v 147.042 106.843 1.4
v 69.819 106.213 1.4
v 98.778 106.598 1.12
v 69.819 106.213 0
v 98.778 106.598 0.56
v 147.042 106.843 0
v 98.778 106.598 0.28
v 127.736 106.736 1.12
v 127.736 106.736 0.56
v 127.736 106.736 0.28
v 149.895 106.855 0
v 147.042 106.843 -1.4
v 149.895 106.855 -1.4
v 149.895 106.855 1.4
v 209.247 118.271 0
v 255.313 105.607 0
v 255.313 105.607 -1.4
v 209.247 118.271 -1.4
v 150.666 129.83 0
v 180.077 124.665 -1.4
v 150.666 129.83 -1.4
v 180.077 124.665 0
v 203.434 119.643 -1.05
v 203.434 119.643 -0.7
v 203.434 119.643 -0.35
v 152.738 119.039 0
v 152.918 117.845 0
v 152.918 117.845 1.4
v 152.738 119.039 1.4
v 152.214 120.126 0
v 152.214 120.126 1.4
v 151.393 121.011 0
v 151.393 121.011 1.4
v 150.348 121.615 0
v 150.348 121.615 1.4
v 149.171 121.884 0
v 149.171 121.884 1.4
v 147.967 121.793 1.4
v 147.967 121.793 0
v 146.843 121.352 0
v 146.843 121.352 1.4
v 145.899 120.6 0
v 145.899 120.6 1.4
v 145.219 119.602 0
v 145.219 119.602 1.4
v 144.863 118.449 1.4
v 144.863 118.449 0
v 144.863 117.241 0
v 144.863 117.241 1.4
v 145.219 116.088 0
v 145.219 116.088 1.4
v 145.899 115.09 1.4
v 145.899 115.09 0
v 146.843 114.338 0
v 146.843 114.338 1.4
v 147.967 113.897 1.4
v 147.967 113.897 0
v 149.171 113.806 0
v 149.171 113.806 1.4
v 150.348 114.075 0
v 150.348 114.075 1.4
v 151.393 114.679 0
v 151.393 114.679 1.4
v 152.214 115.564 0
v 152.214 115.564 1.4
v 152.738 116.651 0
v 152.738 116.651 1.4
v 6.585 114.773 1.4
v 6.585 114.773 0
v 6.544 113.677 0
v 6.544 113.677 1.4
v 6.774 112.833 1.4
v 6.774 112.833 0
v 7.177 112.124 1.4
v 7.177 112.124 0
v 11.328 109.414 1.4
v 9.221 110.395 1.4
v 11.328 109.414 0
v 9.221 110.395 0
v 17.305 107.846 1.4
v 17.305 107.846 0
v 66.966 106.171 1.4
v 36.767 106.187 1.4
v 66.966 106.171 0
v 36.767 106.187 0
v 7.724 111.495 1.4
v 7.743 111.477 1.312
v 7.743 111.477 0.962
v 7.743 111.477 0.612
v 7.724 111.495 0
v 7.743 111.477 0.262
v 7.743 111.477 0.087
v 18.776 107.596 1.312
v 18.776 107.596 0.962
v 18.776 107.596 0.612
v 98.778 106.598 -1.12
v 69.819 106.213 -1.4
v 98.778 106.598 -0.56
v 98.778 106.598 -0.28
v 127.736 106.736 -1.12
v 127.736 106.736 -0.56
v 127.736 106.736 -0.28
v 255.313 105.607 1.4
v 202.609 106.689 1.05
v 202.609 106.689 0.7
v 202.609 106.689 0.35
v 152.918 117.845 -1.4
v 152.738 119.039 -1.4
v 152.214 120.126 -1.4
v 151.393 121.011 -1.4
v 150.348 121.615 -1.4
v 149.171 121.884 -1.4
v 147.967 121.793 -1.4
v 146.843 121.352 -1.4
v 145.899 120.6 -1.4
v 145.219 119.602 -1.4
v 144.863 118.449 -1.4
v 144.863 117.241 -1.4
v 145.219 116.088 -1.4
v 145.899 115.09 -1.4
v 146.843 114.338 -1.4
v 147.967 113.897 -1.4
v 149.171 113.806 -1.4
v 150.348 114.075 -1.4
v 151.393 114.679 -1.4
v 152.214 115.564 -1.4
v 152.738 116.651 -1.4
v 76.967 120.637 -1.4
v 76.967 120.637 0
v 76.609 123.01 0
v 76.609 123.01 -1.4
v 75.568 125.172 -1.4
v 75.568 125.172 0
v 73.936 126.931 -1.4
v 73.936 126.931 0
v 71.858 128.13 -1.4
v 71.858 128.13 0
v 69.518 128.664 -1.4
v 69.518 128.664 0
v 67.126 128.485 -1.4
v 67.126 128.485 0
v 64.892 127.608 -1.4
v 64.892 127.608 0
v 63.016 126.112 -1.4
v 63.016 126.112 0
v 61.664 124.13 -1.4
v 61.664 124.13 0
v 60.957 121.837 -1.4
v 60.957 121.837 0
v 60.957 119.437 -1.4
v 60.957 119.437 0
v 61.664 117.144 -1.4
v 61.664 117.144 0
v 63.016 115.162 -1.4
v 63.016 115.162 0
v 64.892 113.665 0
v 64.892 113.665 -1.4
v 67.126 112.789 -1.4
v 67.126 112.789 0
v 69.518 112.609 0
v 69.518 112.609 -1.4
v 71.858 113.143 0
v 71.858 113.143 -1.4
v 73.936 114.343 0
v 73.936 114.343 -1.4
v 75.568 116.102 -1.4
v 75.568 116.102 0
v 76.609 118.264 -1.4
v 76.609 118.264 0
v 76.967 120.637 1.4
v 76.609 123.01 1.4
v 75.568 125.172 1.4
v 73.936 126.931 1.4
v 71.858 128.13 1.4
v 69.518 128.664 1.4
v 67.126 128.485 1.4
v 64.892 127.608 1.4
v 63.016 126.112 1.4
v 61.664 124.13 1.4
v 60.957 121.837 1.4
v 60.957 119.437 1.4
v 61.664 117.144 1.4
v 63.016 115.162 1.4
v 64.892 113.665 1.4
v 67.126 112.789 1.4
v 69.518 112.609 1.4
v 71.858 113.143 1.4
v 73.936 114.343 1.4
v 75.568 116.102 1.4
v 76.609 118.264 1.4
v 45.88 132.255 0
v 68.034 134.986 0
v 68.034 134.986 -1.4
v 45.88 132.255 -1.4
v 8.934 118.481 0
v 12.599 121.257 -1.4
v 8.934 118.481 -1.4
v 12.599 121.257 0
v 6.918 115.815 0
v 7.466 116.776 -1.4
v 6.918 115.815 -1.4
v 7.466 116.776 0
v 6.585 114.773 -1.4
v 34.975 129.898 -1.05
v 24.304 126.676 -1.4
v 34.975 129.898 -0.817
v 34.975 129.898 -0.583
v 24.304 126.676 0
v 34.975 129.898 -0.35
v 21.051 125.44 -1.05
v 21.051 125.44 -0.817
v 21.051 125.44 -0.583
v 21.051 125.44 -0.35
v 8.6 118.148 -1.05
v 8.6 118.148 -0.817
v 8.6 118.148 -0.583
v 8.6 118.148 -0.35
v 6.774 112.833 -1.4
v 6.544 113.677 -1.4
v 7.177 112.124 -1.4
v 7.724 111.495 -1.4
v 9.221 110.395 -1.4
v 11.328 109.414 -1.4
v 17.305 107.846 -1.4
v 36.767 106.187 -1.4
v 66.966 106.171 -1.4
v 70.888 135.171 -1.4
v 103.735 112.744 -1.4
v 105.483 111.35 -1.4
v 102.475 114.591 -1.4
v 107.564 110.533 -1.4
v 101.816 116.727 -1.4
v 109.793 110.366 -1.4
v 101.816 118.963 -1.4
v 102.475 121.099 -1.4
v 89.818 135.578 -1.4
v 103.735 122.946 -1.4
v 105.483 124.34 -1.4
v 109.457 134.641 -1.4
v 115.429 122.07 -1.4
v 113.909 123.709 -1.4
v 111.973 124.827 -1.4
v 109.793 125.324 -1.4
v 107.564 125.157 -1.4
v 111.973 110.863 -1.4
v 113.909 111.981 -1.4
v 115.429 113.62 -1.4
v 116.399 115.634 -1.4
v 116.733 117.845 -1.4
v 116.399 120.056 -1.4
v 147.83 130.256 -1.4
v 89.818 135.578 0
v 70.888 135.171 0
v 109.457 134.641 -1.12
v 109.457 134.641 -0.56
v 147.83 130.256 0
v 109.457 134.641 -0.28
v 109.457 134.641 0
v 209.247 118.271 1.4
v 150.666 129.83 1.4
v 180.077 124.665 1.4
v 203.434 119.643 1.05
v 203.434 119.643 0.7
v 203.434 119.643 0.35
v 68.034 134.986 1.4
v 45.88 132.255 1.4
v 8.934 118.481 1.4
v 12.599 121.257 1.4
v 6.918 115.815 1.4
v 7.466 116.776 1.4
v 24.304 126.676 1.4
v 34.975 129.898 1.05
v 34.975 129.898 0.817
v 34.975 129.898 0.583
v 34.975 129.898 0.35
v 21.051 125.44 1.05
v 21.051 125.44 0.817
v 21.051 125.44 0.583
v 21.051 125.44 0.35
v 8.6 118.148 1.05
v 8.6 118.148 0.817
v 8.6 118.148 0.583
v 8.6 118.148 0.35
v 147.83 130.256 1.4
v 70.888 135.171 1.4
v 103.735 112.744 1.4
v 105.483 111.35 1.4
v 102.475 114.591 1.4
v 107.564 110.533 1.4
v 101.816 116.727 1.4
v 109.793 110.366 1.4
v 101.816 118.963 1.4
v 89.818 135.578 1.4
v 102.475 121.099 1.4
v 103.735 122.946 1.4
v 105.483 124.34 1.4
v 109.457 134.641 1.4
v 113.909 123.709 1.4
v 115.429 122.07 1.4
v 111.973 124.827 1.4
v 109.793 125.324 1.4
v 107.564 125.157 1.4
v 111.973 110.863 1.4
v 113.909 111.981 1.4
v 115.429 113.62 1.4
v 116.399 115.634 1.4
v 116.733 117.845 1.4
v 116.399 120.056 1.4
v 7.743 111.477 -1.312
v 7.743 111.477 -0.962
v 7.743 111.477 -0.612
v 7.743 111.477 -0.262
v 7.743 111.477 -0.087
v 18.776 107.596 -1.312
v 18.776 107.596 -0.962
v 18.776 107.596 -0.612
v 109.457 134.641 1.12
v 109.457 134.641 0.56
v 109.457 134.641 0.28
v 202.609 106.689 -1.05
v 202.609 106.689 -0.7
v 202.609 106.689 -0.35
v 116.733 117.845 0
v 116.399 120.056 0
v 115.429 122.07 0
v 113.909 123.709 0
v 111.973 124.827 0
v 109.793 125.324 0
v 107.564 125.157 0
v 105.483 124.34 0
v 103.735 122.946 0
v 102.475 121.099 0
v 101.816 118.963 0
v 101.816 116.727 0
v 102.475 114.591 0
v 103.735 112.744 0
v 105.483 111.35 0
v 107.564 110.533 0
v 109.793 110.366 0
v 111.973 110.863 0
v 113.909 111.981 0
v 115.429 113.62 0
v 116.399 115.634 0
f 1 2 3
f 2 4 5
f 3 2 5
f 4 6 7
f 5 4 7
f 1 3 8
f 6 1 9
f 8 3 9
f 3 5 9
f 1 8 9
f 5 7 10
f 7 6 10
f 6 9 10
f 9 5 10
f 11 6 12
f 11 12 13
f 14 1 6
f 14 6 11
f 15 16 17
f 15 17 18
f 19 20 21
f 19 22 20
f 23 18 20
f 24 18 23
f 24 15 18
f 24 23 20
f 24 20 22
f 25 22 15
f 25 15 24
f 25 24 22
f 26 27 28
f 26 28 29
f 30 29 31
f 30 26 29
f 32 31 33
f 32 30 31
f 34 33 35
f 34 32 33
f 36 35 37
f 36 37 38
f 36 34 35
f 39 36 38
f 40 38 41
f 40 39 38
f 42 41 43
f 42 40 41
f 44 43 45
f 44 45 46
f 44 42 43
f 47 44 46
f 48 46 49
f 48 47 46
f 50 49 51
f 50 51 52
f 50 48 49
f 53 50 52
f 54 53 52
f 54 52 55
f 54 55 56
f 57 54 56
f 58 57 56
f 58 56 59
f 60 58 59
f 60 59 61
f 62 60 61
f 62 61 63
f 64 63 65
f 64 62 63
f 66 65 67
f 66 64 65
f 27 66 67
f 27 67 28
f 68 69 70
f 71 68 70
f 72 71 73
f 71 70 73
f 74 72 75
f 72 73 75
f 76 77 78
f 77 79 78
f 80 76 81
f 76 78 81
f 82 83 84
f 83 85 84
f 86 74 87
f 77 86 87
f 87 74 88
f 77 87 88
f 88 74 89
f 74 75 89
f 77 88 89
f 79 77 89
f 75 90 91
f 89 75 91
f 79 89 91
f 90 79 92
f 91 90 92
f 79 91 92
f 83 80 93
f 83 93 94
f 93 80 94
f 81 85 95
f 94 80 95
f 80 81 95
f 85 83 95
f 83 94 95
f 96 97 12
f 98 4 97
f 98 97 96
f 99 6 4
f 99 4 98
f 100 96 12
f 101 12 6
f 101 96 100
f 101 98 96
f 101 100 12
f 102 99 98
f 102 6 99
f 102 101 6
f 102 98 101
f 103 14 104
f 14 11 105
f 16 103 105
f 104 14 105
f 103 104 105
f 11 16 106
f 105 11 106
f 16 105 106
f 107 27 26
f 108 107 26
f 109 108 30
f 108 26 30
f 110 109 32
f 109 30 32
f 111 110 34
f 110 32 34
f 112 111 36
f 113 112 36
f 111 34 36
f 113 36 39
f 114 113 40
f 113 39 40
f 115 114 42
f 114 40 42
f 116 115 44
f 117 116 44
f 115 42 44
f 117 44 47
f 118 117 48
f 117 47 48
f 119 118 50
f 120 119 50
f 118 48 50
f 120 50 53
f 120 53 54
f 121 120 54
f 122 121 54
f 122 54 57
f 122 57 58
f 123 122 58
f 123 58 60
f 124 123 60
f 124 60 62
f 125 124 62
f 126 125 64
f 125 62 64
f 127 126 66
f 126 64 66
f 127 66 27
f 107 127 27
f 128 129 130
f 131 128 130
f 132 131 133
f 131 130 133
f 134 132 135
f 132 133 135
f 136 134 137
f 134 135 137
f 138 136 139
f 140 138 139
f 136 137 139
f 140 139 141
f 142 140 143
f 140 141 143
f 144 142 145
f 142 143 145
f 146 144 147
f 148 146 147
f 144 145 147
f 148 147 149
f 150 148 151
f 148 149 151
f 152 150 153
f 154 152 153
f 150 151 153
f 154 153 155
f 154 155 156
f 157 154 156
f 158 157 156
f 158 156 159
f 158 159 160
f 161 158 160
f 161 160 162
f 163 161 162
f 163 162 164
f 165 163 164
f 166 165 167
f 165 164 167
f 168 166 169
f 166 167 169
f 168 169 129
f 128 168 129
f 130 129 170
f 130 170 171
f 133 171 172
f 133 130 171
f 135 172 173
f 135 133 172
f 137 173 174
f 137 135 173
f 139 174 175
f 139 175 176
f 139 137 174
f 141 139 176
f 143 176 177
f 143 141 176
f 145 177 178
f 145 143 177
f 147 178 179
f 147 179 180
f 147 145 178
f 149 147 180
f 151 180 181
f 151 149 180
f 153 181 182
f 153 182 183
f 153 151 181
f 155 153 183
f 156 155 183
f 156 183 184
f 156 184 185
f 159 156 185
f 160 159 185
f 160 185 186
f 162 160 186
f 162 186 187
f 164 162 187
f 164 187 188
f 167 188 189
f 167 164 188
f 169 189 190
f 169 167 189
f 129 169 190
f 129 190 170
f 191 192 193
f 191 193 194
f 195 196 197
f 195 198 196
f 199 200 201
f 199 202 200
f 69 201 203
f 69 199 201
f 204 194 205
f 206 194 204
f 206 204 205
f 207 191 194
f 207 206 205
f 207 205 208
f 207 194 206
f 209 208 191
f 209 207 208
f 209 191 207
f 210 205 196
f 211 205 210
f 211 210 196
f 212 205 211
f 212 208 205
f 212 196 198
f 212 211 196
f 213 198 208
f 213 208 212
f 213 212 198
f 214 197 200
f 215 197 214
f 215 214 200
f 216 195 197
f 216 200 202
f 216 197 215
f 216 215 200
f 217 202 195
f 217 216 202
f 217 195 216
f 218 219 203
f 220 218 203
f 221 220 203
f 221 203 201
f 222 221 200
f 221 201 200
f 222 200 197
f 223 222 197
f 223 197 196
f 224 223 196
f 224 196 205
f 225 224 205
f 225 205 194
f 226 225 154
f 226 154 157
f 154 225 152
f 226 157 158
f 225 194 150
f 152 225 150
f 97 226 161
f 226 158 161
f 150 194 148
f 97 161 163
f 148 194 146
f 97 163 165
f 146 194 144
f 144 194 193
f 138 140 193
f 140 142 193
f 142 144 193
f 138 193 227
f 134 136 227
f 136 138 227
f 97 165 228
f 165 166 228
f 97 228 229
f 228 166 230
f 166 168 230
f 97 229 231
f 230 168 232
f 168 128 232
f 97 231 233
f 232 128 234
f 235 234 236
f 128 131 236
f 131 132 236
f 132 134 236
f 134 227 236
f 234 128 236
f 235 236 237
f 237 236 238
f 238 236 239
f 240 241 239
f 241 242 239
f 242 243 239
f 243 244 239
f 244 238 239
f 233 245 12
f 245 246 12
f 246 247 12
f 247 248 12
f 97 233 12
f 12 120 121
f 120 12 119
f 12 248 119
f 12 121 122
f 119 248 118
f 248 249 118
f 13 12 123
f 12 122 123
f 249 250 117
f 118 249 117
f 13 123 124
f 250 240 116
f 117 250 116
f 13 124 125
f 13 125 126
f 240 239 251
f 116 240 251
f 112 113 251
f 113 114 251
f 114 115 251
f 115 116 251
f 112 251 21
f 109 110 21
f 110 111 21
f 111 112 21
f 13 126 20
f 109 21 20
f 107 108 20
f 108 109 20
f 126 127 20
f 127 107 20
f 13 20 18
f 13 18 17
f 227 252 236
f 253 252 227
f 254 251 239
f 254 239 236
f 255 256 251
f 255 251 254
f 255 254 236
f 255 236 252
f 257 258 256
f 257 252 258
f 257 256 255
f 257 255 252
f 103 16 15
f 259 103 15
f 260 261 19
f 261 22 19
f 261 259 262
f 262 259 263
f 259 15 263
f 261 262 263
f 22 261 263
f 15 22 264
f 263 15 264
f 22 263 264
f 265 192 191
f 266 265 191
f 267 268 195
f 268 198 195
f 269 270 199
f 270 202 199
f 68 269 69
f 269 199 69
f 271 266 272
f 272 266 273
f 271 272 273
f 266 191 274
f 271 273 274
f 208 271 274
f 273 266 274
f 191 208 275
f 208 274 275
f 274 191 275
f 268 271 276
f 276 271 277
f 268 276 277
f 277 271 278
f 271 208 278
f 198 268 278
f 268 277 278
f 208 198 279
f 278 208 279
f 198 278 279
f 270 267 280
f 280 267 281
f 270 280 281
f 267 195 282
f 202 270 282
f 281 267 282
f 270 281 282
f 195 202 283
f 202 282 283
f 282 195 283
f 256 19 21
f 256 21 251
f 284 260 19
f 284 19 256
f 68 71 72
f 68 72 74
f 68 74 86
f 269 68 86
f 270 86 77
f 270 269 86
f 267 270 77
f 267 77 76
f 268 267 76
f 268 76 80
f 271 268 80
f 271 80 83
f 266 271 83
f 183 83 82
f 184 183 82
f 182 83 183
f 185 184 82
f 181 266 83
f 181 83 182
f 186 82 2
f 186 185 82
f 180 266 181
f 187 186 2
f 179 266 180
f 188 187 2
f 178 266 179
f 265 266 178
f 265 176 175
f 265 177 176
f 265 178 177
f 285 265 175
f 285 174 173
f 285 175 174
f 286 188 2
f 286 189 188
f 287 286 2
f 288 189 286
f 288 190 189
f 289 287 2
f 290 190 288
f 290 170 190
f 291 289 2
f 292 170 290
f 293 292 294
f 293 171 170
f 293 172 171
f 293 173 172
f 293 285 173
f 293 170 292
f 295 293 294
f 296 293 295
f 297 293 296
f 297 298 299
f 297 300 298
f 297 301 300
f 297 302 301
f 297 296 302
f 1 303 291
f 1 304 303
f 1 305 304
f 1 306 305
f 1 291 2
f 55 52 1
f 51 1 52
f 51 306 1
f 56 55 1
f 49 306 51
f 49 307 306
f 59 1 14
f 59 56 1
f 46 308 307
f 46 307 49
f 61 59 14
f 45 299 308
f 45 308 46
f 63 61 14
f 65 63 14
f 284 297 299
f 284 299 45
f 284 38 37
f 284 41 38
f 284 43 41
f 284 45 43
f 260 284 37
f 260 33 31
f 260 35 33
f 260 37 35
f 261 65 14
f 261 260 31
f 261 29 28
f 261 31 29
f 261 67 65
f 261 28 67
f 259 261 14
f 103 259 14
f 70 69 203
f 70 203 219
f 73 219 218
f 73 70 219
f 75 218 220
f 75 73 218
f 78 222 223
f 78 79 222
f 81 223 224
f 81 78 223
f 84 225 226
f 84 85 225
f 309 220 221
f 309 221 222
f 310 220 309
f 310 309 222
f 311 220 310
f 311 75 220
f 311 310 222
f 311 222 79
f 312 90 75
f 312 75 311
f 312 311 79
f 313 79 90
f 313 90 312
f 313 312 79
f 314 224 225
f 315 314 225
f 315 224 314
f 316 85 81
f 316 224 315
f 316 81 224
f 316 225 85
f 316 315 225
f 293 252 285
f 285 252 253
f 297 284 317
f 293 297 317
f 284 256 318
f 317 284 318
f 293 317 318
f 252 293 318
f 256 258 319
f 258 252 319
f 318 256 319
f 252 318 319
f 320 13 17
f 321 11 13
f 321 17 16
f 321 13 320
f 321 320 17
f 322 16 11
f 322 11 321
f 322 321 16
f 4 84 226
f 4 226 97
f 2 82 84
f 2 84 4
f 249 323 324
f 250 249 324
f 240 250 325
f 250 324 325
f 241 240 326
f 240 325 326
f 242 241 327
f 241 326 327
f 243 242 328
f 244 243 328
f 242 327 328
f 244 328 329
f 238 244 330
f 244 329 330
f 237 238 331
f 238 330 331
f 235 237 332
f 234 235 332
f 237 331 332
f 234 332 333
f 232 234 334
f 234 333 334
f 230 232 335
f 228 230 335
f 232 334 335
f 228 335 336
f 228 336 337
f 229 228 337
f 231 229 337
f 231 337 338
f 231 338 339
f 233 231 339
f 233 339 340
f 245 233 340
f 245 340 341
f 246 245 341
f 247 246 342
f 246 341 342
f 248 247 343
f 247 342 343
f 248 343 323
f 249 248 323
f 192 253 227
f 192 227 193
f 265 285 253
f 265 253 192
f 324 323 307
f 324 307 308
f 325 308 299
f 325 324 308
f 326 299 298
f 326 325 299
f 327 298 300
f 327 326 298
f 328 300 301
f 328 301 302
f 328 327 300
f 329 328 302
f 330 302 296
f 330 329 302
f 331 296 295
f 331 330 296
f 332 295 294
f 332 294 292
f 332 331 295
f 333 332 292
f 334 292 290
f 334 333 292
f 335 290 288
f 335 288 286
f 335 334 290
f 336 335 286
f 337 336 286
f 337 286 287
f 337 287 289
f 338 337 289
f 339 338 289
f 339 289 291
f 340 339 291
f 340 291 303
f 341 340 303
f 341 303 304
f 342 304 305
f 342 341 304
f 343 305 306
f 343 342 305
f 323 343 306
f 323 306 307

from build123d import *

# Parameters (mm, degrees)
SKETCH_1_R      = 4.05
SKETCH_1_R_2    = 7.5
SKETCH_1_R_3    = 8.05
EXTRUDE_1_DEPTH = 1.4


with BuildPart() as part:
    # Эскиз1 → Бобышка-Вытянуть1 (new, symmetric)
    with BuildSketch(Plane.XY):
        with BuildLine():
            Line((150.666396798, 129.82962039), (147.830444309, 130.255907631))
            add(Edge.make_bspline(
                [(147.830444309, 130.255907631), (141.461413304, 131.198524366), (128.693359955, 132.886388705), (112.67043132, 134.461645249), (99.826968741, 135.315000175), (86.964020356, 135.731264376), (77.308341909, 135.549477481), (70.887732655, 135.171040436)],
                knots=[0.429725304, 0.429725304, 0.429725304, 0.429725304, 0.50454493, 0.579364556, 0.61677437, 0.654184183, 0.729003809, 0.729003809, 0.729003809, 0.729003809], degree=3))
            Line((70.887732655, 135.171040436), (68.034324351, 134.985663537))
            add(Edge.make_bspline(
                [(68.034324351, 134.985663537), (62.466327292, 134.590052619), (54.128766773, 133.70015523), (43.125220573, 131.802909904), (34.953776148, 129.977054104), (26.907191476, 127.675989274), (20.367980904, 125.262128549), (15.336549935, 122.888373263), (11.739560791, 120.808049659), (8.991532459, 118.696410574), (7.481749343, 116.886227925), (6.915411804, 115.858161553), (6.707897041, 115.274334726), (6.625457542, 114.936901915), (6.585428501, 114.77290226)],
                knots=[0.740090669, 0.740090669, 0.740090669, 0.740090669, 0.805048089, 0.837526799, 0.870005509, 0.902484219, 0.934962929, 0.951202284, 0.967441639, 0.983680994, 0.991800672, 0.99586051, 0.99789043, 0.999920349, 0.999920349, 0.999920349, 0.999920349], degree=3))
            add(Edge.make_bspline(
                [(6.585428501, 114.77290226), (6.563664146, 114.614273348), (6.519009347, 114.285406452), (6.51479073, 113.71087901), (6.741898783, 112.661535219), (7.660184293, 111.409854013), (9.25908473, 110.308268876), (11.044608157, 109.487380203), (12.922194441, 108.850067694), (15.490126457, 108.172753601), (18.768502962, 107.558568007), (22.745443376, 107.043168294), (28.077313003, 106.557350362), (34.7695904, 106.213470375), (42.813490811, 106.037235573), (50.86267748, 106.006056339), (58.913615572, 106.062256394), (64.282042193, 106.132538161), (66.96601172, 106.171159397)],
                knots=[8.1168e-05, 8.1168e-05, 8.1168e-05, 8.1168e-05, 0.0020673, 0.004053433, 0.008025699, 0.015970231, 0.023914763, 0.031859294, 0.039803826, 0.047748358, 0.063637421, 0.079526485, 0.095415548, 0.127193675, 0.158971802, 0.190749929, 0.222528056, 0.254306183, 0.254306183, 0.254306183, 0.254306183], degree=3))
            Line((66.96601172, 106.171159397), (69.819069007, 106.21341025))
            add(Edge.make_bspline(
                [(69.819069007, 106.21341025), (76.253856733, 106.311006841), (85.904794849, 106.472137373), (98.777945674, 106.610759512), (111.6511009, 106.649514986), (127.735402572, 106.732475133), (140.606952957, 106.813706415), (147.042263767, 106.84262009)],
                knots=[0.265565078, 0.265565078, 0.265565078, 0.265565078, 0.341733085, 0.379817088, 0.417901091, 0.494069098, 0.570237104, 0.570237104, 0.570237104, 0.570237104], degree=3))
            Line((147.042263767, 106.84262009), (149.894619256, 106.85475599))
            add(Edge.make_bspline(
                [(149.894619256, 106.85475599), (158.680275083, 106.889957075), (176.251614136, 106.916321205), (202.609661936, 106.730645333), (228.96468106, 106.292568252), (246.530526637, 105.8505877), (255.312881654, 105.606761115)],
                knots=[0.581490104, 0.581490104, 0.581490104, 0.581490104, 0.685469054, 0.789448004, 0.893426954, 0.997405904, 0.997405904, 0.997405904, 0.997405904], degree=3))
            add(Edge.make_bspline(
                [(255.312881654, 105.606761115), (246.756257413, 108.260896884), (229.544442337, 113.256971155), (203.470240893, 119.79978809), (177.1785709, 125.404416996), (159.522198848, 128.478032218), (150.666396798, 129.82962039)],
                knots=[0.00222758, 0.00222758, 0.00222758, 0.00222758, 0.106325046, 0.210422513, 0.31451998, 0.418617446, 0.418617446, 0.418617446, 0.418617446], degree=3))
        make_face()
        with Locations((148.868108764, 117.844985284)):
            Circle(SKETCH_1_R, mode=Mode.SUBTRACT)
        with Locations((109.232573951, 117.844985284)):
            Circle(SKETCH_1_R_2, mode=Mode.SUBTRACT)
        with Locations((68.916842603, 120.636945021)):
            Circle(SKETCH_1_R_3, mode=Mode.SUBTRACT)
    extrude(amount=EXTRUDE_1_DEPTH, both=True)


solid = part.part
